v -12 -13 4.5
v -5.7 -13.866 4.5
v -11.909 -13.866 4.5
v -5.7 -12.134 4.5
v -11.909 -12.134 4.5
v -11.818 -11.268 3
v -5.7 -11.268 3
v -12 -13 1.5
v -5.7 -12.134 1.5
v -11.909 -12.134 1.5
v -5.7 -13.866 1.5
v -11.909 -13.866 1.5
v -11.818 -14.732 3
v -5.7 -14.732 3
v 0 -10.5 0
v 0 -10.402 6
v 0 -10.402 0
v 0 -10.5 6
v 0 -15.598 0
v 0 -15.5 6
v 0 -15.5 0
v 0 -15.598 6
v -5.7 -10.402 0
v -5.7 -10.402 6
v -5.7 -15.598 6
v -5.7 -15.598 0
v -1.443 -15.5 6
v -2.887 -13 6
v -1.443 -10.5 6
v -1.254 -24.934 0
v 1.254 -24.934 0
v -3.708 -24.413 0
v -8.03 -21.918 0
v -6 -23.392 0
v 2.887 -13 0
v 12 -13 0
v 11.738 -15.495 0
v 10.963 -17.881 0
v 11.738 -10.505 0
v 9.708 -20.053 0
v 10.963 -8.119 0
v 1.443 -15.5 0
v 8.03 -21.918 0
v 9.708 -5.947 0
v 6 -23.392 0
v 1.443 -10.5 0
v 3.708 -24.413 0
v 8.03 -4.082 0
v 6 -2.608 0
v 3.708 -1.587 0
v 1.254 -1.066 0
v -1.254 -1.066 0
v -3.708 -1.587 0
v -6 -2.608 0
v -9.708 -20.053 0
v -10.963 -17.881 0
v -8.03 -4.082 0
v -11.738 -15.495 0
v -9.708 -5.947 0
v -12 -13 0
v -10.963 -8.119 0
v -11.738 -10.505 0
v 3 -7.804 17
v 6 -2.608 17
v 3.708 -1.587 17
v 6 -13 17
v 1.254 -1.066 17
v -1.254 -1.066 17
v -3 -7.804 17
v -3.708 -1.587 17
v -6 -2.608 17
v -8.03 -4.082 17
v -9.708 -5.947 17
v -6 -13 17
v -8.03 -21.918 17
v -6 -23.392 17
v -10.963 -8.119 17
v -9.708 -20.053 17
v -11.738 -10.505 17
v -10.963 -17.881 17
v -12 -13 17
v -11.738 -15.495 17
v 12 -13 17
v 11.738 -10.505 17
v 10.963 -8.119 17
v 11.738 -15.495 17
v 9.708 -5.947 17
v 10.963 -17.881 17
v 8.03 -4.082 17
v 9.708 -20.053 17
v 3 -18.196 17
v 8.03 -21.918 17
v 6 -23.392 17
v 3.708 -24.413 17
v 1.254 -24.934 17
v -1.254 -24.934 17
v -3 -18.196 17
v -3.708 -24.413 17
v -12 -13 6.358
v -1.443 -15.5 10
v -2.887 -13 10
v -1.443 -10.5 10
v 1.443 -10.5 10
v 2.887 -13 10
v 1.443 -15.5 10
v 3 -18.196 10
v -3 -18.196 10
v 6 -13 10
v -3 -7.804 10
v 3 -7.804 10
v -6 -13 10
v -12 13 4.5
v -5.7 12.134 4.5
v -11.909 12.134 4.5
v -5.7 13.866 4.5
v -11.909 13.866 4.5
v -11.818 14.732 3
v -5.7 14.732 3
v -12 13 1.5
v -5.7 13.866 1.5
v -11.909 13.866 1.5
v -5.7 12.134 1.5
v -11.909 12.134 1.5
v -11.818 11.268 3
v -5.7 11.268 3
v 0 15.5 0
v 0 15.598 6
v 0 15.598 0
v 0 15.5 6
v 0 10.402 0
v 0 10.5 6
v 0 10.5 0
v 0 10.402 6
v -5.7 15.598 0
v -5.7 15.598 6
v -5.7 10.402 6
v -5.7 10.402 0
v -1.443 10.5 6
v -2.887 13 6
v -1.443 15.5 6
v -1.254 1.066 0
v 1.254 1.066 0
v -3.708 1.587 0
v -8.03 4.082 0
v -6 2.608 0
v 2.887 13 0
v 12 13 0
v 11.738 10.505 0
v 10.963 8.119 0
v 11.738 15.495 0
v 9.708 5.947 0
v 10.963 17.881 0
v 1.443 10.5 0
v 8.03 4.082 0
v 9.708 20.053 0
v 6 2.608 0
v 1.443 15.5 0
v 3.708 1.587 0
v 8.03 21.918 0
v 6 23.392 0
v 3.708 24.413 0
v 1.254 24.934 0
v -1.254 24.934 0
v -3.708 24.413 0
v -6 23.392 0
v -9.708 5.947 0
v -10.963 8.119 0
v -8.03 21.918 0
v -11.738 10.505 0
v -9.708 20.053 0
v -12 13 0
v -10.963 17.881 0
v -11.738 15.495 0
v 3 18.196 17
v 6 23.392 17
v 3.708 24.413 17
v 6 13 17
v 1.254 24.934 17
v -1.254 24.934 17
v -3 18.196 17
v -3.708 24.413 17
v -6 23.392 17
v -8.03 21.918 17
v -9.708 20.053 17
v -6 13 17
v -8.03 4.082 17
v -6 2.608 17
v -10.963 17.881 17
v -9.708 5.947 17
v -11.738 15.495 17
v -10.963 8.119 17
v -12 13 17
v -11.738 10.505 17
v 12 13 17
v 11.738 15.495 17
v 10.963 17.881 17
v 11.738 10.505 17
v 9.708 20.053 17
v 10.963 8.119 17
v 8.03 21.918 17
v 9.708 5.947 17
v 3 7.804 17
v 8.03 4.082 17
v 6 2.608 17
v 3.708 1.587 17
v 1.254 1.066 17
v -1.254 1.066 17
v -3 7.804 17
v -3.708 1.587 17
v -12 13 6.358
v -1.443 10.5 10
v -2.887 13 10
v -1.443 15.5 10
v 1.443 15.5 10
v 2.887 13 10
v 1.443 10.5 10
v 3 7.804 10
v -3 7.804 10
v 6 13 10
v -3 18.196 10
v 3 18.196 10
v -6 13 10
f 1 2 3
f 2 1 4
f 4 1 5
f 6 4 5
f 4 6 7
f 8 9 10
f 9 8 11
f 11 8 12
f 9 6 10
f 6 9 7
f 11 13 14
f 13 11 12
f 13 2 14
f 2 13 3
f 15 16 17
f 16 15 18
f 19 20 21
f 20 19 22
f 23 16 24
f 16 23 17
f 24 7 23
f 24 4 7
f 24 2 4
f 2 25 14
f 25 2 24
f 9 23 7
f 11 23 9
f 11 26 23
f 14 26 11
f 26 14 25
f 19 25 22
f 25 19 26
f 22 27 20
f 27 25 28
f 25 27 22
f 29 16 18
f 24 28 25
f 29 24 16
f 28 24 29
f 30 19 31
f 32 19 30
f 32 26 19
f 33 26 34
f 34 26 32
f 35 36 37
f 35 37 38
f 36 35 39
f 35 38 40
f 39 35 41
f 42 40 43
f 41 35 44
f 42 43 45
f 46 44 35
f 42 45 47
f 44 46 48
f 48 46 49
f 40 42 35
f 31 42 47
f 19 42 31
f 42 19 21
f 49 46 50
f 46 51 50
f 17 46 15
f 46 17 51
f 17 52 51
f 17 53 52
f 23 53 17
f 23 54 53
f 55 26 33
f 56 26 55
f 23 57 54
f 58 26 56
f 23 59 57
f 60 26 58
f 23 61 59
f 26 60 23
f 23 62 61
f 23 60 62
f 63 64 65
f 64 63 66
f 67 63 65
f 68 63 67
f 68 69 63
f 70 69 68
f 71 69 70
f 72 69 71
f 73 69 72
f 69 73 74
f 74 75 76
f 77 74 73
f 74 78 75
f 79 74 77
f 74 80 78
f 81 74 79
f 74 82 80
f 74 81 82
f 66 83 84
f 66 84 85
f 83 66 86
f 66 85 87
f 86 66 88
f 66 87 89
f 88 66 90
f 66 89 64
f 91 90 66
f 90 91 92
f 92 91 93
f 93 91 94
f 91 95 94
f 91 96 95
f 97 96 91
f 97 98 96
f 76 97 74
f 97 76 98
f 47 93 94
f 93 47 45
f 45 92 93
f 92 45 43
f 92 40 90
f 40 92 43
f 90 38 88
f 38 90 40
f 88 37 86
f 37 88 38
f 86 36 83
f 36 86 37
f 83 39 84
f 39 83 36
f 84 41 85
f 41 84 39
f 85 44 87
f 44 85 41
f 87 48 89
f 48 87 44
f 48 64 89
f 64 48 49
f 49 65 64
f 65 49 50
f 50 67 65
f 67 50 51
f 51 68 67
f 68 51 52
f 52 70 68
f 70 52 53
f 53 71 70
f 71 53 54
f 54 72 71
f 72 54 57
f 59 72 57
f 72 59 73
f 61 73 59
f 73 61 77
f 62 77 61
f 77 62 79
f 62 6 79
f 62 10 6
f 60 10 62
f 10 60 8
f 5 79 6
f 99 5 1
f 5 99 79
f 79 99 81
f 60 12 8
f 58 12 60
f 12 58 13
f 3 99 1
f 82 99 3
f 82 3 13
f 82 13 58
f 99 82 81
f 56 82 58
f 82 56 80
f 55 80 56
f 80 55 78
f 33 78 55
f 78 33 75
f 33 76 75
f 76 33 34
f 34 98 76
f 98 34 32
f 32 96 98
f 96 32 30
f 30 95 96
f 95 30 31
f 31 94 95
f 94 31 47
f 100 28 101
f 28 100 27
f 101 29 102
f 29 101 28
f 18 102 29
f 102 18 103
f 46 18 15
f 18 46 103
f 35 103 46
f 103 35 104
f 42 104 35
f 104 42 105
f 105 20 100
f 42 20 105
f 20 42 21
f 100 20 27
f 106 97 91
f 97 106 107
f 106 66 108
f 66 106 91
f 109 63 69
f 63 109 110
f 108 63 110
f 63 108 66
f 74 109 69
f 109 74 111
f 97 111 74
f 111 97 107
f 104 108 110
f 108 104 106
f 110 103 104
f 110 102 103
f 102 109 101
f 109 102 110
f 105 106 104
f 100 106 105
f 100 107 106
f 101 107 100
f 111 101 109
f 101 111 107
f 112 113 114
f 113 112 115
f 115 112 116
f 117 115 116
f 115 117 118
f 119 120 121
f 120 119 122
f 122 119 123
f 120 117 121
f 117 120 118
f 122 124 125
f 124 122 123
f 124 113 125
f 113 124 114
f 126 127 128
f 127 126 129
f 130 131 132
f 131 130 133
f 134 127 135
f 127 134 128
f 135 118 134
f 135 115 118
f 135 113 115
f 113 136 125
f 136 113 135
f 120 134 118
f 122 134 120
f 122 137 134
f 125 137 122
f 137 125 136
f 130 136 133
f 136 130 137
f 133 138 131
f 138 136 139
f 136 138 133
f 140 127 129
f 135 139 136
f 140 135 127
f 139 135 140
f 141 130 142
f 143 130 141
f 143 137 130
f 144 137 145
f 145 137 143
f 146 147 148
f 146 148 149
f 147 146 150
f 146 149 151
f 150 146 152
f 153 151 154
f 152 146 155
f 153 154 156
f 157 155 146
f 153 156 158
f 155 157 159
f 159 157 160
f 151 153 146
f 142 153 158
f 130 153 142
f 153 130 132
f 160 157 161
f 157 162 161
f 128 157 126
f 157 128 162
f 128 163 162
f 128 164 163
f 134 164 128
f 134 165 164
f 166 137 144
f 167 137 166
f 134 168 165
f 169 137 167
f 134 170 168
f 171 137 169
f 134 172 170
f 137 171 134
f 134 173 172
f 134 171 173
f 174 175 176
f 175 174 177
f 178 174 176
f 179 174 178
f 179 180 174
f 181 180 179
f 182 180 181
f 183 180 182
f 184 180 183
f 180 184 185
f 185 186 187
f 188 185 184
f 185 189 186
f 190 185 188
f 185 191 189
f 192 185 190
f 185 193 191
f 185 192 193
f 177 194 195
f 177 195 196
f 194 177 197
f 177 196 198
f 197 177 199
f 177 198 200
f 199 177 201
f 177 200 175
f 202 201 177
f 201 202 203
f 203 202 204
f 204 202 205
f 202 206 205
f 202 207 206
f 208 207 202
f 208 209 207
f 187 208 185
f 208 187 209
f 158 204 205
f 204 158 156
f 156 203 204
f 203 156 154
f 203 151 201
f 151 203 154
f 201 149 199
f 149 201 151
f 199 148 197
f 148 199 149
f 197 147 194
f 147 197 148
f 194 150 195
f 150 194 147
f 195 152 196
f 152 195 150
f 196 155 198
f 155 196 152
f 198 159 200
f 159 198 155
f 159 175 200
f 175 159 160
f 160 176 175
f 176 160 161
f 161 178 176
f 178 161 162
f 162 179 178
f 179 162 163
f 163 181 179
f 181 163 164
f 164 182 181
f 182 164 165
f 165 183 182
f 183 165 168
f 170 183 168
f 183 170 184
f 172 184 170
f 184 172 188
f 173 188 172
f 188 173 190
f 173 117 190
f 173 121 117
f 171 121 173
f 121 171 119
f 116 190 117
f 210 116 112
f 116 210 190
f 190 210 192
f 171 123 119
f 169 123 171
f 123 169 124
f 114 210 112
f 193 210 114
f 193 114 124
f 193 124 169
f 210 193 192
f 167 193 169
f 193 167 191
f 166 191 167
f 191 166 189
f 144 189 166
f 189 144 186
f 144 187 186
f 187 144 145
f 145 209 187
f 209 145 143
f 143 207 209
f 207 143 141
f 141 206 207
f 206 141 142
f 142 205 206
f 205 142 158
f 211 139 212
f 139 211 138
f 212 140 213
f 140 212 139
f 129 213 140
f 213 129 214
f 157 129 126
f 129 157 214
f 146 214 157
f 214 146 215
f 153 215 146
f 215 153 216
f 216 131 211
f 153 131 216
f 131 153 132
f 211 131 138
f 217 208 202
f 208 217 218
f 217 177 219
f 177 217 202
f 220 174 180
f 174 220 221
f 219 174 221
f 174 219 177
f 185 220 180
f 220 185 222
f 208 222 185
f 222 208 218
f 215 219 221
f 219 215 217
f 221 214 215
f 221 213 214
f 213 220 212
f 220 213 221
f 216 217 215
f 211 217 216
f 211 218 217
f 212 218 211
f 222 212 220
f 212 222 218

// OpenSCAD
include <wallace.scad>;

!for(side = [-1,1]) translate([0, side * motor_screw_spacing / 2, 0]) leadscrew_coupler();
